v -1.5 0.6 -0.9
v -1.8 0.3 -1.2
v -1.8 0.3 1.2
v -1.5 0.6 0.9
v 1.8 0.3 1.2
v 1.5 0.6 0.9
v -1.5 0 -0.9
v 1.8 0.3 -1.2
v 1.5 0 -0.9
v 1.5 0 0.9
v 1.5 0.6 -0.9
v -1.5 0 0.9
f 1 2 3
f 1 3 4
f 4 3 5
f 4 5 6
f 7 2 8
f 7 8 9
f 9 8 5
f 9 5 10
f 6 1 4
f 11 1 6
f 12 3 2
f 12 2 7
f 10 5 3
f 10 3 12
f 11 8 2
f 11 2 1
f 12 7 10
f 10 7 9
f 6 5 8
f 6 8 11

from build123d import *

# Parameters (mm, degrees)
ESQUISSE1_W        = 3.6
ESQUISSE1_H        = 2.4
BOSS_EXTRU_1_DEPTH = 0.6
CHANFREIN1_SIZE    = 0.3


with BuildPart() as part:
    # Esquisse1 → Boss.-Extru.1 (new body)
    with BuildSketch(Plane(origin=(0, 0, 0), x_dir=(1, 0, 0), z_dir=(0, 1, 0))):
        Rectangle(ESQUISSE1_W, ESQUISSE1_H)
    extrude(amount=BOSS_EXTRU_1_DEPTH)

    # Chanfrein1
    # the kernel refuses this chamfer: 0.3 mm, written as the material it takes off along each edge
    with BuildSketch(Plane(origin=(2.571504896, 0, 1.2), x_dir=(0, 0.9996219169112968, 0.027495876610586632), z_dir=(-1, 0, 0)), Plane(origin=(-2.571504896, 0, -1.2), x_dir=(0, 0.9996219169112968, -0.027495876610586632), z_dir=(1, 0, 0))) as chanfrein1_piece_1:
        Polygon((CHANFREIN1_SIZE * 0.999621916911, CHANFREIN1_SIZE * 0.0274958766106), (-CHANFREIN1_SIZE * 0.0274958766106, CHANFREIN1_SIZE * 0.999621916911), (0, 0), align=None)
    extrude(amount=5.143009793, mode=Mode.SUBTRACT)
    with BuildSketch(Plane(origin=(1.8, 0, -1.971504896), x_dir=(0.027495876610586632, 0.9996219169112968, 0), z_dir=(0, 0, 1)), Plane(origin=(-1.8, 0, 1.971504896), x_dir=(-0.027495876610586632, 0.9996219169112968, 0), z_dir=(0, 0, -1))) as chanfrein1_piece_2:
        Polygon((CHANFREIN1_SIZE * 0.999621916911, CHANFREIN1_SIZE * 0.0274958766106), (-CHANFREIN1_SIZE * 0.0274958766106, CHANFREIN1_SIZE * 0.999621916911), (0, 0), align=None)
    extrude(amount=3.943009793, mode=Mode.SUBTRACT)
    with BuildSketch(Plane(origin=(-2.571504896, 0.6, -1.2), x_dir=(0, -0.9996219169112968, -0.027495876610586632), z_dir=(1, 0, 0)), Plane(origin=(2.571504896, 0.6, 1.2), x_dir=(0, -0.9996219169112968, 0.027495876610586632), z_dir=(-1, 0, 0))) as chanfrein1_piece_3:
        Polygon((CHANFREIN1_SIZE * 0.999621916911, -CHANFREIN1_SIZE * 0.0274958766106), (-CHANFREIN1_SIZE * 0.0274958766106, -CHANFREIN1_SIZE * 0.999621916911), (0, 0), align=None)
    extrude(amount=5.143009793, mode=Mode.SUBTRACT)
    with BuildSketch(Plane(origin=(1.8, 0.6, -1.971504896), x_dir=(0.027495876610586632, -0.9996219169112968, 0), z_dir=(0, 0, 1)), Plane(origin=(-1.8, 0.6, 1.971504896), x_dir=(-0.027495876610586632, -0.9996219169112968, 0), z_dir=(0, 0, -1))) as chanfrein1_piece_4:
        Polygon((CHANFREIN1_SIZE * 0.999621916911, -CHANFREIN1_SIZE * 0.0274958766106), (-CHANFREIN1_SIZE * 0.0274958766106, -CHANFREIN1_SIZE * 0.999621916911), (0, 0), align=None)
    extrude(amount=3.943009793, mode=Mode.SUBTRACT)


solid = part.part
